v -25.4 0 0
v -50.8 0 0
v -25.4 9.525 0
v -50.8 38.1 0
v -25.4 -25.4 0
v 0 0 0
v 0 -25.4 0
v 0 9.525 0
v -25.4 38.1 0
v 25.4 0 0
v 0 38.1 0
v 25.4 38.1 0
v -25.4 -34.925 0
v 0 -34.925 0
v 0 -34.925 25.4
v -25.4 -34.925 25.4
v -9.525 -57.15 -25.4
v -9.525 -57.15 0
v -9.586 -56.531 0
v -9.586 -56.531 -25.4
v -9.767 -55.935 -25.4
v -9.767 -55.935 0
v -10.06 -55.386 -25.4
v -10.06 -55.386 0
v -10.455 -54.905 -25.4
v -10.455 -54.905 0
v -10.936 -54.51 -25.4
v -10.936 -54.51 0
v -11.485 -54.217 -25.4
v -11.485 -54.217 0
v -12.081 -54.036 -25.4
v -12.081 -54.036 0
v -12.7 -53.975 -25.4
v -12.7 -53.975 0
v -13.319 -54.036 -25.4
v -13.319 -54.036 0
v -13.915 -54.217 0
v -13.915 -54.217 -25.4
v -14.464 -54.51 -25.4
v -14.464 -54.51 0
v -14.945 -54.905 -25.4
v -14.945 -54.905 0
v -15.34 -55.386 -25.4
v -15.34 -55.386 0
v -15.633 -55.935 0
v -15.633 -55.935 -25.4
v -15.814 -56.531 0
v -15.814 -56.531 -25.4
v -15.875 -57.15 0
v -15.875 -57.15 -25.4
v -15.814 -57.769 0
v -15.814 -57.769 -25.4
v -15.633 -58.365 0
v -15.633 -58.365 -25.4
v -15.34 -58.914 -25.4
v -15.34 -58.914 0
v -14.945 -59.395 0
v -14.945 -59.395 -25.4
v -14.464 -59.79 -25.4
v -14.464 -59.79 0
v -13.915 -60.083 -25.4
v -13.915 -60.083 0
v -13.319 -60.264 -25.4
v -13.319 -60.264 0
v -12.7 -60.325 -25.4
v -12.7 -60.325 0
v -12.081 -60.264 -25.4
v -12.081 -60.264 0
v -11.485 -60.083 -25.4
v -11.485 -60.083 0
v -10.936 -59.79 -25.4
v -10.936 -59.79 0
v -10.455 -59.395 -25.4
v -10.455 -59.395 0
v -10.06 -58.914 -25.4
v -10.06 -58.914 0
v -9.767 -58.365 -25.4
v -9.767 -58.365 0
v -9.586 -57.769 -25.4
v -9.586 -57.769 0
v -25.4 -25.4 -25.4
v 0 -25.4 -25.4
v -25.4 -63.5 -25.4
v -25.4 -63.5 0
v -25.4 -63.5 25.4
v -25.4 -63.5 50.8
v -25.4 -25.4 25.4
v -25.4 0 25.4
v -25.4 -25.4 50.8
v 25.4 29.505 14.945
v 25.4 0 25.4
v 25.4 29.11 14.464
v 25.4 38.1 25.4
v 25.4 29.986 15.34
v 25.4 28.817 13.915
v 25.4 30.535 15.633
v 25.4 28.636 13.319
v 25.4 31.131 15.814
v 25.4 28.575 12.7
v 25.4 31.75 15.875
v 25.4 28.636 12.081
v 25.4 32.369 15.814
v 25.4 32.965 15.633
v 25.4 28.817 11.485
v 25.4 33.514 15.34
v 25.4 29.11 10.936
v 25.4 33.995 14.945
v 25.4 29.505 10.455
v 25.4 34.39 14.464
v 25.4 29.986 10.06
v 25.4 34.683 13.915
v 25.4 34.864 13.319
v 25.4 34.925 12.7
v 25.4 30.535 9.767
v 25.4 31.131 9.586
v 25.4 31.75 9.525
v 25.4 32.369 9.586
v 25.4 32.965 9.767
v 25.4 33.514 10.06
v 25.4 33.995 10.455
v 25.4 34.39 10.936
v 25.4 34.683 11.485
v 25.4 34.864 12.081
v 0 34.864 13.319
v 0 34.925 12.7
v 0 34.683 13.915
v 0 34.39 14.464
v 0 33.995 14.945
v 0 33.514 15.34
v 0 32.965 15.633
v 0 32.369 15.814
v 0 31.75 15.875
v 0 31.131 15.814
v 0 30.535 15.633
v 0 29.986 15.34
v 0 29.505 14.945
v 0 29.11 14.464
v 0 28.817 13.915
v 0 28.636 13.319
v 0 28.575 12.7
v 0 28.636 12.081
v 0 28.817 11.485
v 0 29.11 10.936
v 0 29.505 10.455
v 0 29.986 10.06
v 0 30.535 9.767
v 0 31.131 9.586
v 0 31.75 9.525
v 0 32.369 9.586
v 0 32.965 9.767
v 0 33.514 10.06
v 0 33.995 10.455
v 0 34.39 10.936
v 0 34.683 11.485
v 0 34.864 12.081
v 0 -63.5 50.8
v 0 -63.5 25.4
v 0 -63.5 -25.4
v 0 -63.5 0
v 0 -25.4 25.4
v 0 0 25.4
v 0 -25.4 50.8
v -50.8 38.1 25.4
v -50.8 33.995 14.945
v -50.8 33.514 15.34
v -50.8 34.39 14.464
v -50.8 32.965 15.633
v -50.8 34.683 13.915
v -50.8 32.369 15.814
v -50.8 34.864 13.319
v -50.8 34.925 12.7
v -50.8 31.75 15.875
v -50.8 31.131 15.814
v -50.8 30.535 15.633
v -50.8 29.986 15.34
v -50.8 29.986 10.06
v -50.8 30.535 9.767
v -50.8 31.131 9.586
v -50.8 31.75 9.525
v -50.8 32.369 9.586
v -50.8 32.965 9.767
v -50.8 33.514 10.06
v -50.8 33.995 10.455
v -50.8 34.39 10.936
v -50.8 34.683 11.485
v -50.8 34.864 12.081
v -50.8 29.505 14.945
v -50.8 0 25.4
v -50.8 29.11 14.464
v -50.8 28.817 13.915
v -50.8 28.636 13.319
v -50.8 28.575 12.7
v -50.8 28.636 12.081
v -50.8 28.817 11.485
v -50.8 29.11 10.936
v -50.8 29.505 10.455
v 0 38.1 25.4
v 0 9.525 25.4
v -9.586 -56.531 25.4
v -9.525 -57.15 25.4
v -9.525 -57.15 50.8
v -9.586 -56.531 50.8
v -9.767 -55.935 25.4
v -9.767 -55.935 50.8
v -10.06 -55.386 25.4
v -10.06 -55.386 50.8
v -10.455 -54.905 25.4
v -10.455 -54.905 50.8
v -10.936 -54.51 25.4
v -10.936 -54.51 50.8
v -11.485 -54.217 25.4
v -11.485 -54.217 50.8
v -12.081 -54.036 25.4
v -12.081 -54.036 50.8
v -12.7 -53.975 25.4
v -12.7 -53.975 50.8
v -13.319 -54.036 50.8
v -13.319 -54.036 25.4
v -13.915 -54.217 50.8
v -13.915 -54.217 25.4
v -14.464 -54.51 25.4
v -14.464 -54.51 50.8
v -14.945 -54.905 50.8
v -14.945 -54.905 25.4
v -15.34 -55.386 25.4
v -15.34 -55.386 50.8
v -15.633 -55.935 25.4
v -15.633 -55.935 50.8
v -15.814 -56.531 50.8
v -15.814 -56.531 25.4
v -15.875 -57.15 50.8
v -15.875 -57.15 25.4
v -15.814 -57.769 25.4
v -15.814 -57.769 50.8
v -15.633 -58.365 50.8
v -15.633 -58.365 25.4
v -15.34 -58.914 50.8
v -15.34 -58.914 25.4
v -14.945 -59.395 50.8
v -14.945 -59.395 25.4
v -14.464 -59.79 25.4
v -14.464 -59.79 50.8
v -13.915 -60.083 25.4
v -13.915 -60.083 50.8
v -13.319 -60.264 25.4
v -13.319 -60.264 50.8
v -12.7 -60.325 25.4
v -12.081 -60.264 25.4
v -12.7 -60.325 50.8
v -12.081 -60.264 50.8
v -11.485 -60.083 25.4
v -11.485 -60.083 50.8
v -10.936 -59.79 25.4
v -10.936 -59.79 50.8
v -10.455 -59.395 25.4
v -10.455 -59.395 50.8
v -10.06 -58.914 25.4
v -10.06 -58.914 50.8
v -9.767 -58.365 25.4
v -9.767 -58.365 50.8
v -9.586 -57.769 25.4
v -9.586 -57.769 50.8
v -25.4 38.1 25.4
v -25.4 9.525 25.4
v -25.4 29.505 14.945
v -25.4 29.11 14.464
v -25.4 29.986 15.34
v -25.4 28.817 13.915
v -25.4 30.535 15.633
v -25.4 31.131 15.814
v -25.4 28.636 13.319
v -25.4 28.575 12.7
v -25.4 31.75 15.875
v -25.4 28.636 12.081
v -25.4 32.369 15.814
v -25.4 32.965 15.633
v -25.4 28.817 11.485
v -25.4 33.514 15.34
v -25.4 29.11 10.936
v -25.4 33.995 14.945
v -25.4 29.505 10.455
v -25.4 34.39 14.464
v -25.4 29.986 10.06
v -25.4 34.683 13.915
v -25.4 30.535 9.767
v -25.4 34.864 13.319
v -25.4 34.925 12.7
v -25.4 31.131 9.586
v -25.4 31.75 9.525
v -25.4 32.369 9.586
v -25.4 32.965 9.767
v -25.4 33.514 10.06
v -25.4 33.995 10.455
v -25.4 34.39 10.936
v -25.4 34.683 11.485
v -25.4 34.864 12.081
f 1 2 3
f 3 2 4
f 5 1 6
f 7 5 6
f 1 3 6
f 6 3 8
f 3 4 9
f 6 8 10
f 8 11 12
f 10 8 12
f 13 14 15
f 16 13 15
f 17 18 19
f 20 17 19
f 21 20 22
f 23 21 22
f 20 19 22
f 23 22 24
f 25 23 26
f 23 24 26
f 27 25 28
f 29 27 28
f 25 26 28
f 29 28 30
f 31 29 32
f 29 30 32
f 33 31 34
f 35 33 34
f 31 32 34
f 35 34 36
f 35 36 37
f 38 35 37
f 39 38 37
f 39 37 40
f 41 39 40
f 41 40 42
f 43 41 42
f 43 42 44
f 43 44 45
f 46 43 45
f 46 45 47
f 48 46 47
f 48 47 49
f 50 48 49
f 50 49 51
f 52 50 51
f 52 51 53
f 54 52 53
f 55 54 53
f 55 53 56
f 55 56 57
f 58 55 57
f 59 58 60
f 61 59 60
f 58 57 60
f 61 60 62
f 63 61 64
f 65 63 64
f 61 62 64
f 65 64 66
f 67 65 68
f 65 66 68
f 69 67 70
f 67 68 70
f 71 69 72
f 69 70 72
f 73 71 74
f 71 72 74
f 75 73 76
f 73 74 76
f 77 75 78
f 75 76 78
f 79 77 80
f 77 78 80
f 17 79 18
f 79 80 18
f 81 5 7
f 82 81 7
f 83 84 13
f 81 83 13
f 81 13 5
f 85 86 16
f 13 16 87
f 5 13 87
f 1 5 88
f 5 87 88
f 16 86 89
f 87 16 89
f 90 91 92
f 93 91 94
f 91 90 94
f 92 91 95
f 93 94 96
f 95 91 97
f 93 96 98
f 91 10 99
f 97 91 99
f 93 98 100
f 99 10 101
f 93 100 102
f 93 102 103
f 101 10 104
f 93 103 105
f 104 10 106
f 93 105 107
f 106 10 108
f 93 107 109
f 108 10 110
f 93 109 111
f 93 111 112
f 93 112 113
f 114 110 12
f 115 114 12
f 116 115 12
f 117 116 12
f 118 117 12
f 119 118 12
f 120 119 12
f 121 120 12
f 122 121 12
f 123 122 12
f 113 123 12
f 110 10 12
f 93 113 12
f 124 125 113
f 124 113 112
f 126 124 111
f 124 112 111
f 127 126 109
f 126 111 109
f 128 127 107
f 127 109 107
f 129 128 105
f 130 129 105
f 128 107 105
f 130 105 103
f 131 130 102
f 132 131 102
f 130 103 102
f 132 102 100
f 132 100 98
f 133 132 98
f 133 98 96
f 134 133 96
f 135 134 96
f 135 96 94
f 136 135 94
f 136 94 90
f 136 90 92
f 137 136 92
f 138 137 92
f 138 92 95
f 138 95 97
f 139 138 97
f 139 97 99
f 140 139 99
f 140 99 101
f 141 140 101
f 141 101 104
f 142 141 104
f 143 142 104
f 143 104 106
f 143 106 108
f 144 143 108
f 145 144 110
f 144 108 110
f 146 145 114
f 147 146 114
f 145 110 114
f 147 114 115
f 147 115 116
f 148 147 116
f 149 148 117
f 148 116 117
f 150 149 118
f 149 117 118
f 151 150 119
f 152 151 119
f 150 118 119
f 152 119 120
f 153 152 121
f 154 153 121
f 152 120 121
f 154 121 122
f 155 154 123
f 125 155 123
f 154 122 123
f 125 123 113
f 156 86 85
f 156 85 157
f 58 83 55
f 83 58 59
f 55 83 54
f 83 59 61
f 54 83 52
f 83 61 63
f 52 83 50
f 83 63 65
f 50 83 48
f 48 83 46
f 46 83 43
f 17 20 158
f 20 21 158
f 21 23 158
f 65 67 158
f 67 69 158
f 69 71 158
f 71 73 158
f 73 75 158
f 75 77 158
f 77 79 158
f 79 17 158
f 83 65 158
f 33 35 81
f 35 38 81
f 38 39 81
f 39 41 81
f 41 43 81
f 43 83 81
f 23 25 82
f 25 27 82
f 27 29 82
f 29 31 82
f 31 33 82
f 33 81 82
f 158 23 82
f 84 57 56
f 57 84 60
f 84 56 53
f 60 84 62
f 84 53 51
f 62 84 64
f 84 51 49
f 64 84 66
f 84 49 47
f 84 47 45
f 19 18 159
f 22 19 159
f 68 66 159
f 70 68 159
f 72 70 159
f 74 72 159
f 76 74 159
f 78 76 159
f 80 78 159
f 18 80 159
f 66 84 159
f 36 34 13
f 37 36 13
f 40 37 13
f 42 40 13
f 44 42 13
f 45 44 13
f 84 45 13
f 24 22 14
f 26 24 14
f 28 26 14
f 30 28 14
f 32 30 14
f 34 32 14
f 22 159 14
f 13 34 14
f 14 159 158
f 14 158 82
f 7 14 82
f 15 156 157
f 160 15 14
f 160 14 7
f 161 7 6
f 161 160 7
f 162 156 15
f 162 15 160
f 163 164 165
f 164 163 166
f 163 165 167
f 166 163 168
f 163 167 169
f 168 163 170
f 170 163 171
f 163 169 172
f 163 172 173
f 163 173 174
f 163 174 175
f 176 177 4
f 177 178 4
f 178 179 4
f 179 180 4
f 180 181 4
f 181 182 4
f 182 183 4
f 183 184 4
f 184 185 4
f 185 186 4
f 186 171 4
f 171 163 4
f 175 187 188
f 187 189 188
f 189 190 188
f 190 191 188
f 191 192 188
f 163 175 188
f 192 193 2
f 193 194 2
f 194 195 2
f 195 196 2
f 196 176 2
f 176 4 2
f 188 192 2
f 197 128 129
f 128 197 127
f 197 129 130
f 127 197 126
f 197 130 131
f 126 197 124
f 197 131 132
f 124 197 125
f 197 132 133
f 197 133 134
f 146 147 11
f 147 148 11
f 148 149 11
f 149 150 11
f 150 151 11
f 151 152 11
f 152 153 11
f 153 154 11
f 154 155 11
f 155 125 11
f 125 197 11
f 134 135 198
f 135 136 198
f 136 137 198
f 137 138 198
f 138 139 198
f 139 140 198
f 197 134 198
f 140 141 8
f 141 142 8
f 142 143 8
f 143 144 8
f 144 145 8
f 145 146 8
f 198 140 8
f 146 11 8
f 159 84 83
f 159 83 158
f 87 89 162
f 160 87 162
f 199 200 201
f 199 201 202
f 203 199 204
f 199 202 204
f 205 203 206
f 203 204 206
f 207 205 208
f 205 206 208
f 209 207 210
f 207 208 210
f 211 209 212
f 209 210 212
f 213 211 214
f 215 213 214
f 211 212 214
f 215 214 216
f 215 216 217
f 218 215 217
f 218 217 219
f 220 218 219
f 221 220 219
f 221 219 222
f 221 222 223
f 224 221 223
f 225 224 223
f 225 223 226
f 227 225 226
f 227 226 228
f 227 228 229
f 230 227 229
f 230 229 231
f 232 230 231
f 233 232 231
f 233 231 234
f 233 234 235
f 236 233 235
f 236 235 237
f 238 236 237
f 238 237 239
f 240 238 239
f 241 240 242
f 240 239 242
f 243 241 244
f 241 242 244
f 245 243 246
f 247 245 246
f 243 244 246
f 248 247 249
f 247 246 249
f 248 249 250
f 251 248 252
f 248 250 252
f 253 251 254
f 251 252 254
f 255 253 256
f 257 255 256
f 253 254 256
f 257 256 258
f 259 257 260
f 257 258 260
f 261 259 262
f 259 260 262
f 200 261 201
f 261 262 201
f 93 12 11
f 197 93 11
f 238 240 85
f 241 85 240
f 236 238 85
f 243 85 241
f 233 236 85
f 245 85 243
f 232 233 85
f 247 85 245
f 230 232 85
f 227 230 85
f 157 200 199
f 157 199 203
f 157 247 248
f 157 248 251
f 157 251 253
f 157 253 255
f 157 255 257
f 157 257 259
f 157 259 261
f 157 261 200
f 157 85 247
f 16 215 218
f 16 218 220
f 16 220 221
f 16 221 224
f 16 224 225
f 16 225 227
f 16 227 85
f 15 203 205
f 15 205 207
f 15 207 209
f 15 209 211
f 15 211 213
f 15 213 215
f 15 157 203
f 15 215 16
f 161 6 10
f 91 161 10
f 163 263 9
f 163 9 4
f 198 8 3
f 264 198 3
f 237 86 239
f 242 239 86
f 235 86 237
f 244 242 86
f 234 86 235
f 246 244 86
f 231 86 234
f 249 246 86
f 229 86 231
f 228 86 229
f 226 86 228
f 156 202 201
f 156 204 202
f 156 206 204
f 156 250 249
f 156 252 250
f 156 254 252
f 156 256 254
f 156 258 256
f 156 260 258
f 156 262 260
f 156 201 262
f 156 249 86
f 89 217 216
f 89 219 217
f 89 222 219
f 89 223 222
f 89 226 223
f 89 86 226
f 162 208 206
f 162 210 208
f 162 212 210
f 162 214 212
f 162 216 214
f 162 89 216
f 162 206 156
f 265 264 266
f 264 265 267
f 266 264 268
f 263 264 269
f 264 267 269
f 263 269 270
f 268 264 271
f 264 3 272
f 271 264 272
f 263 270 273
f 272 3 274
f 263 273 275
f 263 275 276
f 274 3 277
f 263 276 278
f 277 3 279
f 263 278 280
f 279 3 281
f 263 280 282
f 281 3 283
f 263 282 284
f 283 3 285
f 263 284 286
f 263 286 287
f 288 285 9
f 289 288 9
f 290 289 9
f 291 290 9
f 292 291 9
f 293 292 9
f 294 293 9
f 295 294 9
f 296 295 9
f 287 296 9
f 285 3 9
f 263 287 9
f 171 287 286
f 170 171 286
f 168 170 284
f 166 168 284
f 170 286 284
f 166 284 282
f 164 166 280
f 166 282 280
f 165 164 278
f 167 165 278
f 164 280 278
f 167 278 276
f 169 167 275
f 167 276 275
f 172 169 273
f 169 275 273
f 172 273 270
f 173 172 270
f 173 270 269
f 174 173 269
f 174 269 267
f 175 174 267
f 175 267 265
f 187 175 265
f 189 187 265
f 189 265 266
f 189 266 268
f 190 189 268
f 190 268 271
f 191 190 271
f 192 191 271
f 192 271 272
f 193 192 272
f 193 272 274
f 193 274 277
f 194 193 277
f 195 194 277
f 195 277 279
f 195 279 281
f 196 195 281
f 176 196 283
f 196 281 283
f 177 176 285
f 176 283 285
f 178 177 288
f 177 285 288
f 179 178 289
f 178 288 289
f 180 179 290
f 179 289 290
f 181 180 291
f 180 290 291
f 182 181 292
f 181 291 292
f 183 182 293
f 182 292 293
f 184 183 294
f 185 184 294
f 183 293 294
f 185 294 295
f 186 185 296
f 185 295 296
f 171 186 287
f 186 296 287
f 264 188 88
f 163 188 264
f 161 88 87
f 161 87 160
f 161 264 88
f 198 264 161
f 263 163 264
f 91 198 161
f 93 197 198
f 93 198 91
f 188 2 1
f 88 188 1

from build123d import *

# Parameters (mm, degrees)
F0_W      = 25.4
F0_H      = 25.4
F1_DEPTH  = 25.4
F3_DEPTH  = 25.4
F4_W      = 76.2
F4_H      = 76.2
F5_DEPTH  = 38.1
F6_W      = 25.4
F6_H      = 38.1
F7_DEPTH  = 101.6
F8_W      = 28.575
F8_H      = 25.4
F9_DEPTH  = 25.4
F10_R     = 3.175
F11_DEPTH = 101.6
F12_R     = 3.175
F13_DEPTH = 127


with BuildPart() as f1:
    # F0 (on Front) → F1 (new body)
    with BuildSketch(Plane.XZ):
        with Locations((-12.7, 12.7)):
            Rectangle(F0_W, F0_H)
    extrude(amount=F1_DEPTH)

    # F2 (on Top) → F3 (join)
    with BuildSketch(Plane.XY):
        Polygon((25.4, 0), (25.4, 38.1), (0, 38.1), (0, 9.525), (-25.4, 9.525), (-25.4, 38.1), (-50.8, 38.1), (-50.8, 0), align=None)
    extrude(amount=F3_DEPTH)

    # F4 (on face) → F5 (join)
    with BuildSketch(Plane.XZ.offset(25.4)):
        with Locations((-12.7, 12.7)):
            Rectangle(F4_W, F4_H)
    extrude(amount=F5_DEPTH)

    # F6 (on face) → F7 (cut)
    with BuildSketch(Plane.XY.offset(50.8)):
        with Locations((12.7, -44.45)):
            Rectangle(F6_W, F6_H)
        with Locations((-38.1, -44.45)):
            Rectangle(F6_W, F6_H)
    extrude(amount=-F7_DEPTH, mode=Mode.SUBTRACT)

    # F8 (on face) → F9 (cut)
    with BuildSketch(Plane.YZ):
        with Locations((-49.2125, 12.7)):
            Rectangle(F8_W, F8_H)
    extrude(amount=-F9_DEPTH, mode=Mode.SUBTRACT)

    # F10 (on face) → F11 (cut)
    with BuildSketch(Plane.XY.offset(50.8)):
        with Locations((-12.7, -57.15)):
            Circle(F10_R)
    extrude(amount=-F11_DEPTH, mode=Mode.SUBTRACT)

    # F12 (on face) → F13 (cut)
    with BuildSketch(Plane.YZ.offset(25.4)):
        with Locations((31.75, 12.7)):
            Circle(F12_R)
    extrude(amount=-F13_DEPTH, mode=Mode.SUBTRACT)


solid = f1.part
